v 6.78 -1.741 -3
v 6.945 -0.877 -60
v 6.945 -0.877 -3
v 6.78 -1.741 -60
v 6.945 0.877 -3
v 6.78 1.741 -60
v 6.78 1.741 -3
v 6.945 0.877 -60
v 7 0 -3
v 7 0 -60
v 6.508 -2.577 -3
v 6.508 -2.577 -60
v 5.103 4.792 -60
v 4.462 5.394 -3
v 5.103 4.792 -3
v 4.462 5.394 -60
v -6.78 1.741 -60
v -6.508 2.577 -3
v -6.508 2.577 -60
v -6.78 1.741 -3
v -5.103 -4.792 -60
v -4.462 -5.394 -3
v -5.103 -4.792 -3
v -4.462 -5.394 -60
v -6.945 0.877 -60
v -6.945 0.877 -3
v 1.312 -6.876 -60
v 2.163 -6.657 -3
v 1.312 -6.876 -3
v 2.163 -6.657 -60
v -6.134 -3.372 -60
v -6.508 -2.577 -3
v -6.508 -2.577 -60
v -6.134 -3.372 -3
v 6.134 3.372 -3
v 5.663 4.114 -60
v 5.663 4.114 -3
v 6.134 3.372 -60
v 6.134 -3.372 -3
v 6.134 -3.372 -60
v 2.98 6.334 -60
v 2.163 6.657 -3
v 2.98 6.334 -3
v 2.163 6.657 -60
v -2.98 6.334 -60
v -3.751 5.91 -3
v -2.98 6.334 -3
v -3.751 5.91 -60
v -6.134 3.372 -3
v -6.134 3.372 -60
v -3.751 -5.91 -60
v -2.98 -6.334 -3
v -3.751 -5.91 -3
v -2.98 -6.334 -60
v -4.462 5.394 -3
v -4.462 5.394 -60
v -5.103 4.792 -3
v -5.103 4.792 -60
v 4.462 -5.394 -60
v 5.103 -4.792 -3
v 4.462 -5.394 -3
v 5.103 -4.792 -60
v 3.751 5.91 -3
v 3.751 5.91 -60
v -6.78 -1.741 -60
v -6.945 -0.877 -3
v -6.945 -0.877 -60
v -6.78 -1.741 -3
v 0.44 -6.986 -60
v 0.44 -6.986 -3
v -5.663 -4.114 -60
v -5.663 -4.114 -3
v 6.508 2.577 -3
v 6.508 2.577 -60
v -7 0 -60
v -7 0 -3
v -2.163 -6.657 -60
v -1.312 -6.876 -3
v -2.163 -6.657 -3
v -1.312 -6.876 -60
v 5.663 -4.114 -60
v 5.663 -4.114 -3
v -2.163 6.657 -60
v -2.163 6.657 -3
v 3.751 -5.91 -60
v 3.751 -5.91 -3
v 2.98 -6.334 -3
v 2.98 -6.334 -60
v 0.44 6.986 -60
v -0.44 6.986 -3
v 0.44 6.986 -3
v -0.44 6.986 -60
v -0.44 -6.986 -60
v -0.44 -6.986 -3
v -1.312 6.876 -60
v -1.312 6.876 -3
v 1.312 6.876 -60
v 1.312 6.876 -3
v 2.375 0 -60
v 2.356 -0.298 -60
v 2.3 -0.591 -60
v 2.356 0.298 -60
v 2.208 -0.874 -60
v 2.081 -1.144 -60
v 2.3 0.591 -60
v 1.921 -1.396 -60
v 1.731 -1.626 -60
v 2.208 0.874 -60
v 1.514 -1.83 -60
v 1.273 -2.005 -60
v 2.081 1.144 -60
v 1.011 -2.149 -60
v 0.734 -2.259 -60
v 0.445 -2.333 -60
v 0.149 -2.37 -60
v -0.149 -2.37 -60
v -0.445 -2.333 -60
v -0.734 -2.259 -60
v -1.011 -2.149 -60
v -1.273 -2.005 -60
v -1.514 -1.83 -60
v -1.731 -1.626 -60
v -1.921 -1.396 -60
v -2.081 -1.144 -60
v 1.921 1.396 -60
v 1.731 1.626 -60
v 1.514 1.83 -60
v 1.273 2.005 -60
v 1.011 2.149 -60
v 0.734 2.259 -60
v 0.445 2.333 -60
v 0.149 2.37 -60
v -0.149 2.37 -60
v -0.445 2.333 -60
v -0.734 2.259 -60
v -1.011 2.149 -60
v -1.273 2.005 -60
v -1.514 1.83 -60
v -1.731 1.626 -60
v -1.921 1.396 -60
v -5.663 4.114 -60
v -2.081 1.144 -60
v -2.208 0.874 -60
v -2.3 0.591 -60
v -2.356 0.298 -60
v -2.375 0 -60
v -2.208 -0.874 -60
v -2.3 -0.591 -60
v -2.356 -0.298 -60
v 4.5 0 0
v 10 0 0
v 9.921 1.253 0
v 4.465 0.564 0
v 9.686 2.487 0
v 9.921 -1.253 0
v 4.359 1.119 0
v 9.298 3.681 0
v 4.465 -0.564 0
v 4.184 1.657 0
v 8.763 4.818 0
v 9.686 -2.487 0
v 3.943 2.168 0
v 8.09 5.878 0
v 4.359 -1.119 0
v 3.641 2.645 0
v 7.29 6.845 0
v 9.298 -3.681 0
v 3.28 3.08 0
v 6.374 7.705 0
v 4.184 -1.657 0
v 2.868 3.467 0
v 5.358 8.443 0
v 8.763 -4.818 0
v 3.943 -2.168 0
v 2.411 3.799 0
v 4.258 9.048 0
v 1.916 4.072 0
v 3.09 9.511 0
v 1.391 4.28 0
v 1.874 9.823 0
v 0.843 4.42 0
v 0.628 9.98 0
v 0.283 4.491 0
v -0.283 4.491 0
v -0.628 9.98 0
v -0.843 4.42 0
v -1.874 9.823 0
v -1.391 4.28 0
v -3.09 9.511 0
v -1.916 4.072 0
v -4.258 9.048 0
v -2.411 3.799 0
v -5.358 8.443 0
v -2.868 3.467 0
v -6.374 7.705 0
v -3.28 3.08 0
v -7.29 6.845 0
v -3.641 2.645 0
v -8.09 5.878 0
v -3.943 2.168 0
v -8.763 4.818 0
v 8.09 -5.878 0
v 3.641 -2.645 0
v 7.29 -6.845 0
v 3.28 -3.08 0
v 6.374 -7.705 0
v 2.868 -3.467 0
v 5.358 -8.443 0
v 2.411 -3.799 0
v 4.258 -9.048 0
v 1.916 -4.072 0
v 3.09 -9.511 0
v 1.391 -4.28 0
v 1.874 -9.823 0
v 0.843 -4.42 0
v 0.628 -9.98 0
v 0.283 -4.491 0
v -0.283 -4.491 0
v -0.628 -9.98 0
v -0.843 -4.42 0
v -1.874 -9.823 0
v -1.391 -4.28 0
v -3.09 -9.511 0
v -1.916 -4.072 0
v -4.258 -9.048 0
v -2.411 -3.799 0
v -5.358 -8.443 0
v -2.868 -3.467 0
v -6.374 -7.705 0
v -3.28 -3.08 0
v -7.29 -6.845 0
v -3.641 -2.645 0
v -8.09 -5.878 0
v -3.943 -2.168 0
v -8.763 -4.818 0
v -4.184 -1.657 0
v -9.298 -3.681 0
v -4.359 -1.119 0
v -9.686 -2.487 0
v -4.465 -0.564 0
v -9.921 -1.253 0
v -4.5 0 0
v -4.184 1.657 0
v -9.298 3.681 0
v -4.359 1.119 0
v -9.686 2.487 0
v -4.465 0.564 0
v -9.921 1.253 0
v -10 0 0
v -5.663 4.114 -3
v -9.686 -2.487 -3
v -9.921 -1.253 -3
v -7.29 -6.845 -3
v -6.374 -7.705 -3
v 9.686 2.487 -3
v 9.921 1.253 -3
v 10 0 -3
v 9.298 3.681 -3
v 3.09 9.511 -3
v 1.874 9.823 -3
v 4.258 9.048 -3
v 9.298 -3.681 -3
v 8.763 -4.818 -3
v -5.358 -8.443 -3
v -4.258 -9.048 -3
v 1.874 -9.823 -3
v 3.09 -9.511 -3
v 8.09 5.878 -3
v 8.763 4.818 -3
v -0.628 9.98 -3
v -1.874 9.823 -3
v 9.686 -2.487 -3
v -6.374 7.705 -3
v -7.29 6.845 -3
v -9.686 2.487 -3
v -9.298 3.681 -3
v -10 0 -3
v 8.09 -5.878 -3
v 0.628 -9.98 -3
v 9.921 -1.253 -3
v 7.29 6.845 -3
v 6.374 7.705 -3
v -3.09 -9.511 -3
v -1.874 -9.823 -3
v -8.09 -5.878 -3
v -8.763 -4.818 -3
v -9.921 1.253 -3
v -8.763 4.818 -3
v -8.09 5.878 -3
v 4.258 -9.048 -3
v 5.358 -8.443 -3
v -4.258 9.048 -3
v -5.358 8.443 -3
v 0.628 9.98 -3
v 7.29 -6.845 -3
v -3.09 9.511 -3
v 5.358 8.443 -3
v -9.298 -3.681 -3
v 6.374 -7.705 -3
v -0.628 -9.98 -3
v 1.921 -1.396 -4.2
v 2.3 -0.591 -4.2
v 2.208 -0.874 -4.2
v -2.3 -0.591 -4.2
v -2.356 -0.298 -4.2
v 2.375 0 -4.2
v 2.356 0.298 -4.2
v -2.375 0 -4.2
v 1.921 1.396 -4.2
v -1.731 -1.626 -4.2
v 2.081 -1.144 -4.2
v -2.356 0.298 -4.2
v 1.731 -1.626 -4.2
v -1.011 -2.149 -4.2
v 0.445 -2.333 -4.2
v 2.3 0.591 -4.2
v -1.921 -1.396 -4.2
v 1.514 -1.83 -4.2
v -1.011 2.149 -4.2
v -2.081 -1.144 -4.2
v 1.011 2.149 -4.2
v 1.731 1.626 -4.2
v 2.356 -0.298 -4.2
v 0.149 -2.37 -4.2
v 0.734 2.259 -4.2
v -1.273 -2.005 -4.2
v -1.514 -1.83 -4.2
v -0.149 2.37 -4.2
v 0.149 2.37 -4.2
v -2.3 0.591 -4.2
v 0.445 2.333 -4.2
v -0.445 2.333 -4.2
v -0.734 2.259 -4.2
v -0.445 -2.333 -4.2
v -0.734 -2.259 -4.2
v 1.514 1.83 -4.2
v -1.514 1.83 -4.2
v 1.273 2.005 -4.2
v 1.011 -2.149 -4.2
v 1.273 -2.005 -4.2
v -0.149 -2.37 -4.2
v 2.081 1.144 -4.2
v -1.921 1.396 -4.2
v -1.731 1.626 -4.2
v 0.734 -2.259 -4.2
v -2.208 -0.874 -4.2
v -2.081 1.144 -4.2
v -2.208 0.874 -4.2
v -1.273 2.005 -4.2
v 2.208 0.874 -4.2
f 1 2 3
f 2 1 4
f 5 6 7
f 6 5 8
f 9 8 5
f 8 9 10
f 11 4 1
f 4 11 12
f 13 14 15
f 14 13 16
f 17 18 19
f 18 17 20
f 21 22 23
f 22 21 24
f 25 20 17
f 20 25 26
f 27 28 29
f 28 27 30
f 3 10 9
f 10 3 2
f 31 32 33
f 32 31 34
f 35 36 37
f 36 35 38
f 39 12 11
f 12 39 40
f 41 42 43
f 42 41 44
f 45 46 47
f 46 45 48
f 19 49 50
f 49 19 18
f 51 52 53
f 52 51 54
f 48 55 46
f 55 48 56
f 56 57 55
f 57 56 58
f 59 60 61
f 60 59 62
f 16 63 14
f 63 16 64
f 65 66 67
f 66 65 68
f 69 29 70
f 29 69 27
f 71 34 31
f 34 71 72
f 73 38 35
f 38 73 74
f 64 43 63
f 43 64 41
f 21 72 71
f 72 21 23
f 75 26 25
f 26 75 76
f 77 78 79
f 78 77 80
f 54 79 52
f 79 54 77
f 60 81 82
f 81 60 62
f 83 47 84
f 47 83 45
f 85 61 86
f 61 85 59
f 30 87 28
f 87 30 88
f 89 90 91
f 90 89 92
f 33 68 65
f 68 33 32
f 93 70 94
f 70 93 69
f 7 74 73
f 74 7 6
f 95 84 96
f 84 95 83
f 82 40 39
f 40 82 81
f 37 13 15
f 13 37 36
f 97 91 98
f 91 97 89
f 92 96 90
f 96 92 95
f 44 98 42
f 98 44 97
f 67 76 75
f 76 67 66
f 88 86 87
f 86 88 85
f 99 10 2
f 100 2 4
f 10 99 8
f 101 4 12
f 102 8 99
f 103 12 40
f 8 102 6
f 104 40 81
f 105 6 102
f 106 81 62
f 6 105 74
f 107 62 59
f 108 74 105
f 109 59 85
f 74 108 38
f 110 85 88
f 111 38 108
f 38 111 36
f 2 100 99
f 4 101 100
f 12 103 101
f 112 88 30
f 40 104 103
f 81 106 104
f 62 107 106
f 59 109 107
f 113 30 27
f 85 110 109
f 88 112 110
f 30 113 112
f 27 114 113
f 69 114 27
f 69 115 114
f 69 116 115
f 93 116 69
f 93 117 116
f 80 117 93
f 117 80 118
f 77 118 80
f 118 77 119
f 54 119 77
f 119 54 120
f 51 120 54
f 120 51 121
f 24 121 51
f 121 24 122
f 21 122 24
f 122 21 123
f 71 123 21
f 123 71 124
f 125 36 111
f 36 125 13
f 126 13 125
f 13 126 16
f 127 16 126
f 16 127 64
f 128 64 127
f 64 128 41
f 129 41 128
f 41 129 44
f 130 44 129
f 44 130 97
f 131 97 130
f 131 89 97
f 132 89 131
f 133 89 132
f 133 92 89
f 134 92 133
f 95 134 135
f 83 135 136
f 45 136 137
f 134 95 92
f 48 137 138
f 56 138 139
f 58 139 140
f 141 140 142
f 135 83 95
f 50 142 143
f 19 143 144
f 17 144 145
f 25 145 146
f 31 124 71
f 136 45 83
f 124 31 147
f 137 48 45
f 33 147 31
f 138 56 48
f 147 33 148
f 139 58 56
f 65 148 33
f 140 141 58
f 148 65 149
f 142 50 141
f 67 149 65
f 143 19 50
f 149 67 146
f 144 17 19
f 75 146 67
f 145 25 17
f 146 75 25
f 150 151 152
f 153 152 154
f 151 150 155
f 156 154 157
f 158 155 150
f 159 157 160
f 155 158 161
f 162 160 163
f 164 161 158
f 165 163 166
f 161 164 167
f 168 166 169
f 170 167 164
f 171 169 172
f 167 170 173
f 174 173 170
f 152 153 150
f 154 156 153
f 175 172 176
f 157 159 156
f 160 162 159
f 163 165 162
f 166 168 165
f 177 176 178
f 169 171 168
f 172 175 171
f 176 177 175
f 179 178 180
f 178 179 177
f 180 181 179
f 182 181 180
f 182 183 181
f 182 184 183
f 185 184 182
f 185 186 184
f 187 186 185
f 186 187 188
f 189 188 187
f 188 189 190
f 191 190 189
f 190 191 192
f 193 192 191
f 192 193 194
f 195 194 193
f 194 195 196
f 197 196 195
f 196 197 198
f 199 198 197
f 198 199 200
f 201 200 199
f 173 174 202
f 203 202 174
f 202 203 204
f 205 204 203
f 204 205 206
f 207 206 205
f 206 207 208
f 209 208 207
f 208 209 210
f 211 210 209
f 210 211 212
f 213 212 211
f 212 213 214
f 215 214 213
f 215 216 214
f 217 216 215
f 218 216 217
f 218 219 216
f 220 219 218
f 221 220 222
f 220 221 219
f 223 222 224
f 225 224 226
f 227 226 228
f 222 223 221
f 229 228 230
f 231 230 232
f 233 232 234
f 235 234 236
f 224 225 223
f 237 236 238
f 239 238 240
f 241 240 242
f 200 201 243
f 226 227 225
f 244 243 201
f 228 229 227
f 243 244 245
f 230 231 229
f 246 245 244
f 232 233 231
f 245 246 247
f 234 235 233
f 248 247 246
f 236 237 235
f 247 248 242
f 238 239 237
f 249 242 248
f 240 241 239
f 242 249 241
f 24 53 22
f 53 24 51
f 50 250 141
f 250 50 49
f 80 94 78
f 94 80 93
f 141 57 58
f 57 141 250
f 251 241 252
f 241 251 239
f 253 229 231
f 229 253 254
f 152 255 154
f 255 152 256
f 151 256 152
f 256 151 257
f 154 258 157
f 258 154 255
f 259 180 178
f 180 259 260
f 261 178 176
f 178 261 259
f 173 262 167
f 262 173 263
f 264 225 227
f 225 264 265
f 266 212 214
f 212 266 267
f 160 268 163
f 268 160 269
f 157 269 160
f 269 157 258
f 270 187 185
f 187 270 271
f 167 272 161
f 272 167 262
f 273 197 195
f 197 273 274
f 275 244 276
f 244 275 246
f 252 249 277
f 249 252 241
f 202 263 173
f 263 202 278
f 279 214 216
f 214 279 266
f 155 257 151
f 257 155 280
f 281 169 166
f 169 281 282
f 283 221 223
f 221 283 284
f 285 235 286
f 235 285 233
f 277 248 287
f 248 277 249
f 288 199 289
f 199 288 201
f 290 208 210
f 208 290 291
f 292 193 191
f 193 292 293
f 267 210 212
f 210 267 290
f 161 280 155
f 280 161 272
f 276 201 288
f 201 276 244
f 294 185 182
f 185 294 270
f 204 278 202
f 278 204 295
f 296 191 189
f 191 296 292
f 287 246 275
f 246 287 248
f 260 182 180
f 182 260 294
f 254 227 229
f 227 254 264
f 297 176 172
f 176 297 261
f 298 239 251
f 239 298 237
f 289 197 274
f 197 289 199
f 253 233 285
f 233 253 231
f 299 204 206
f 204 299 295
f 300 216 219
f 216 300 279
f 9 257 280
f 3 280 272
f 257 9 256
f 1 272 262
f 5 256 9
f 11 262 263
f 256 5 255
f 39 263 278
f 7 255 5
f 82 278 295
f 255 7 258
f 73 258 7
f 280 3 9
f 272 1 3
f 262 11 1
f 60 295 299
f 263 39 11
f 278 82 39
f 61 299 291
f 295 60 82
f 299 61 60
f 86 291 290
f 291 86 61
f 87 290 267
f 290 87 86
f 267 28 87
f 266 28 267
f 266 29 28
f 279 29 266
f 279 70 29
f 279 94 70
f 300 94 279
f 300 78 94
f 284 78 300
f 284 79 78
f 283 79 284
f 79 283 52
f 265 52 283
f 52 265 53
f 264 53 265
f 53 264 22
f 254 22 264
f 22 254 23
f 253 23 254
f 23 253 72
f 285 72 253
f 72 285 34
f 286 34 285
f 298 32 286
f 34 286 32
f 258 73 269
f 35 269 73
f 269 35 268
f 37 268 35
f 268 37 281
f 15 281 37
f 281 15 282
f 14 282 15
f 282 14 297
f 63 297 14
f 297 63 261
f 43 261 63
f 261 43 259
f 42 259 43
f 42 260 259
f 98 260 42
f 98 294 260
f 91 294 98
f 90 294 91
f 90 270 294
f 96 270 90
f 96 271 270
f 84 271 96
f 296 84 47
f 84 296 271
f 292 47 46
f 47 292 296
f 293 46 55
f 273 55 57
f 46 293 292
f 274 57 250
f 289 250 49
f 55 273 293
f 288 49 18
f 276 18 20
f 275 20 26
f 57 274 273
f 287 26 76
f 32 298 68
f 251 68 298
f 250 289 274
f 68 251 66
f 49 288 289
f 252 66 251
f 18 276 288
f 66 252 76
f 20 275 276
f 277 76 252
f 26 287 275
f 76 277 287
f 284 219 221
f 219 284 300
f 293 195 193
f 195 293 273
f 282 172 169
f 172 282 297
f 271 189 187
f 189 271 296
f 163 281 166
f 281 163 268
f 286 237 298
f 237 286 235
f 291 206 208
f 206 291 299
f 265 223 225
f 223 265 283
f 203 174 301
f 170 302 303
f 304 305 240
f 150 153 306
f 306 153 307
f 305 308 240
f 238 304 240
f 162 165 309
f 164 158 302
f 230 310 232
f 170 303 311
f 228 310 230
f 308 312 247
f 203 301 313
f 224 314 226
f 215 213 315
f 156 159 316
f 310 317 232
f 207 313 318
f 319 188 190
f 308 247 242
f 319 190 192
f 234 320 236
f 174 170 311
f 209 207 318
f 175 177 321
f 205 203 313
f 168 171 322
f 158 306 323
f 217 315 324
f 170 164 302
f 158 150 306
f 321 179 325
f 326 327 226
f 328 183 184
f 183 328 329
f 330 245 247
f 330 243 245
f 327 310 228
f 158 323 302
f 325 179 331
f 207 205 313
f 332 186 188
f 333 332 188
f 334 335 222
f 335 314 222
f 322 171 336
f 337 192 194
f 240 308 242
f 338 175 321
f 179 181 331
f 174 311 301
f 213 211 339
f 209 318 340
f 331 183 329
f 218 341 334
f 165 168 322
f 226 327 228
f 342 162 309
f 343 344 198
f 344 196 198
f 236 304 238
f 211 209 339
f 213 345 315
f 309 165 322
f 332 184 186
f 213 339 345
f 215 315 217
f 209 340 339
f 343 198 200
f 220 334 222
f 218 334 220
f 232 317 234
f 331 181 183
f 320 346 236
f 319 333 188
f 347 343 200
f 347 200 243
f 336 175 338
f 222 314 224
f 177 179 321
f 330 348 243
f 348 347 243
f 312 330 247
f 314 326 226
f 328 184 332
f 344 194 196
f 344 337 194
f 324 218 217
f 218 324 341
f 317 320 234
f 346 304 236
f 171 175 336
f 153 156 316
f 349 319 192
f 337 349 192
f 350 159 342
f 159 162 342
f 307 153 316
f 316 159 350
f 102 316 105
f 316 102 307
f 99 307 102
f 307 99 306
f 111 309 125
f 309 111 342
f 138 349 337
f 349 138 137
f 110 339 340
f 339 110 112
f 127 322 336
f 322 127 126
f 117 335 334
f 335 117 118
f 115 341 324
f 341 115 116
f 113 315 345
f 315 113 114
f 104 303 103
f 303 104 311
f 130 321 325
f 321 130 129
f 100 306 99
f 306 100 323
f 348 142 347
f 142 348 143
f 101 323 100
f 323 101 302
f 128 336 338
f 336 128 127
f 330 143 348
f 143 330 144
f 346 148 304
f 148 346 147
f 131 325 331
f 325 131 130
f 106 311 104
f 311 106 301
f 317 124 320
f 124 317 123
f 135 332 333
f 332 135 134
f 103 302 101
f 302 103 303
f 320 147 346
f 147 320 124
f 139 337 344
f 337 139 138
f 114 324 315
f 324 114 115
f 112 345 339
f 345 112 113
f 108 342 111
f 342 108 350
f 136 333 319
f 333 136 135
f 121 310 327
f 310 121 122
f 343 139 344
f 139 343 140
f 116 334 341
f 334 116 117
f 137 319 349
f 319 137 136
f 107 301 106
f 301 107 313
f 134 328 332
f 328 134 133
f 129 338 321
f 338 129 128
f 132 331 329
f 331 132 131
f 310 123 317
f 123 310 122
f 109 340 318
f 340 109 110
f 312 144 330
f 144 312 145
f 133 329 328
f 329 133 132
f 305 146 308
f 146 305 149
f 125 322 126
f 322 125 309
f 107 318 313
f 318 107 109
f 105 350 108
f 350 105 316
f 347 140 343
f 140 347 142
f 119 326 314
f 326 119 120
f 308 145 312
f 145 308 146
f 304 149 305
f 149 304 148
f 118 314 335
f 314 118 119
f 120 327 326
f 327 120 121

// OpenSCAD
$fn = 50;


difference() {
	union() {
		translate(v = [0, 0, -60.0000000000]) {
			cylinder(h = 60, r = 7.0000000000);
		}
		translate(v = [0, 0, -3.0000000000]) {
			cylinder(h = 3, r = 10.0000000000);
		}
	}
	union() {
		translate(v = [0, 0, 0]) {
			rotate(a = [0, 0, 0]) {
				difference() {
					union() {
						#translate(v = [0, 0, -60.0000000000]) {
							cylinder(h = 60, r = 2.2500000000);
						}
						#translate(v = [0, 0, -4.2000000000]) {
							cylinder(h = 4.2000000000, r1 = 2.3750000000, r2 = 4.5000000000);
						}
						#translate(v = [0, 0, -60.0000000000]) {
							cylinder(h = 60, r = 2.3750000000);
						}
						#translate(v = [0, 0, -60.0000000000]) {
							cylinder(h = 60, r = 2.2500000000);
						}
					}
					union();
				}
			}
		}
	}
}
